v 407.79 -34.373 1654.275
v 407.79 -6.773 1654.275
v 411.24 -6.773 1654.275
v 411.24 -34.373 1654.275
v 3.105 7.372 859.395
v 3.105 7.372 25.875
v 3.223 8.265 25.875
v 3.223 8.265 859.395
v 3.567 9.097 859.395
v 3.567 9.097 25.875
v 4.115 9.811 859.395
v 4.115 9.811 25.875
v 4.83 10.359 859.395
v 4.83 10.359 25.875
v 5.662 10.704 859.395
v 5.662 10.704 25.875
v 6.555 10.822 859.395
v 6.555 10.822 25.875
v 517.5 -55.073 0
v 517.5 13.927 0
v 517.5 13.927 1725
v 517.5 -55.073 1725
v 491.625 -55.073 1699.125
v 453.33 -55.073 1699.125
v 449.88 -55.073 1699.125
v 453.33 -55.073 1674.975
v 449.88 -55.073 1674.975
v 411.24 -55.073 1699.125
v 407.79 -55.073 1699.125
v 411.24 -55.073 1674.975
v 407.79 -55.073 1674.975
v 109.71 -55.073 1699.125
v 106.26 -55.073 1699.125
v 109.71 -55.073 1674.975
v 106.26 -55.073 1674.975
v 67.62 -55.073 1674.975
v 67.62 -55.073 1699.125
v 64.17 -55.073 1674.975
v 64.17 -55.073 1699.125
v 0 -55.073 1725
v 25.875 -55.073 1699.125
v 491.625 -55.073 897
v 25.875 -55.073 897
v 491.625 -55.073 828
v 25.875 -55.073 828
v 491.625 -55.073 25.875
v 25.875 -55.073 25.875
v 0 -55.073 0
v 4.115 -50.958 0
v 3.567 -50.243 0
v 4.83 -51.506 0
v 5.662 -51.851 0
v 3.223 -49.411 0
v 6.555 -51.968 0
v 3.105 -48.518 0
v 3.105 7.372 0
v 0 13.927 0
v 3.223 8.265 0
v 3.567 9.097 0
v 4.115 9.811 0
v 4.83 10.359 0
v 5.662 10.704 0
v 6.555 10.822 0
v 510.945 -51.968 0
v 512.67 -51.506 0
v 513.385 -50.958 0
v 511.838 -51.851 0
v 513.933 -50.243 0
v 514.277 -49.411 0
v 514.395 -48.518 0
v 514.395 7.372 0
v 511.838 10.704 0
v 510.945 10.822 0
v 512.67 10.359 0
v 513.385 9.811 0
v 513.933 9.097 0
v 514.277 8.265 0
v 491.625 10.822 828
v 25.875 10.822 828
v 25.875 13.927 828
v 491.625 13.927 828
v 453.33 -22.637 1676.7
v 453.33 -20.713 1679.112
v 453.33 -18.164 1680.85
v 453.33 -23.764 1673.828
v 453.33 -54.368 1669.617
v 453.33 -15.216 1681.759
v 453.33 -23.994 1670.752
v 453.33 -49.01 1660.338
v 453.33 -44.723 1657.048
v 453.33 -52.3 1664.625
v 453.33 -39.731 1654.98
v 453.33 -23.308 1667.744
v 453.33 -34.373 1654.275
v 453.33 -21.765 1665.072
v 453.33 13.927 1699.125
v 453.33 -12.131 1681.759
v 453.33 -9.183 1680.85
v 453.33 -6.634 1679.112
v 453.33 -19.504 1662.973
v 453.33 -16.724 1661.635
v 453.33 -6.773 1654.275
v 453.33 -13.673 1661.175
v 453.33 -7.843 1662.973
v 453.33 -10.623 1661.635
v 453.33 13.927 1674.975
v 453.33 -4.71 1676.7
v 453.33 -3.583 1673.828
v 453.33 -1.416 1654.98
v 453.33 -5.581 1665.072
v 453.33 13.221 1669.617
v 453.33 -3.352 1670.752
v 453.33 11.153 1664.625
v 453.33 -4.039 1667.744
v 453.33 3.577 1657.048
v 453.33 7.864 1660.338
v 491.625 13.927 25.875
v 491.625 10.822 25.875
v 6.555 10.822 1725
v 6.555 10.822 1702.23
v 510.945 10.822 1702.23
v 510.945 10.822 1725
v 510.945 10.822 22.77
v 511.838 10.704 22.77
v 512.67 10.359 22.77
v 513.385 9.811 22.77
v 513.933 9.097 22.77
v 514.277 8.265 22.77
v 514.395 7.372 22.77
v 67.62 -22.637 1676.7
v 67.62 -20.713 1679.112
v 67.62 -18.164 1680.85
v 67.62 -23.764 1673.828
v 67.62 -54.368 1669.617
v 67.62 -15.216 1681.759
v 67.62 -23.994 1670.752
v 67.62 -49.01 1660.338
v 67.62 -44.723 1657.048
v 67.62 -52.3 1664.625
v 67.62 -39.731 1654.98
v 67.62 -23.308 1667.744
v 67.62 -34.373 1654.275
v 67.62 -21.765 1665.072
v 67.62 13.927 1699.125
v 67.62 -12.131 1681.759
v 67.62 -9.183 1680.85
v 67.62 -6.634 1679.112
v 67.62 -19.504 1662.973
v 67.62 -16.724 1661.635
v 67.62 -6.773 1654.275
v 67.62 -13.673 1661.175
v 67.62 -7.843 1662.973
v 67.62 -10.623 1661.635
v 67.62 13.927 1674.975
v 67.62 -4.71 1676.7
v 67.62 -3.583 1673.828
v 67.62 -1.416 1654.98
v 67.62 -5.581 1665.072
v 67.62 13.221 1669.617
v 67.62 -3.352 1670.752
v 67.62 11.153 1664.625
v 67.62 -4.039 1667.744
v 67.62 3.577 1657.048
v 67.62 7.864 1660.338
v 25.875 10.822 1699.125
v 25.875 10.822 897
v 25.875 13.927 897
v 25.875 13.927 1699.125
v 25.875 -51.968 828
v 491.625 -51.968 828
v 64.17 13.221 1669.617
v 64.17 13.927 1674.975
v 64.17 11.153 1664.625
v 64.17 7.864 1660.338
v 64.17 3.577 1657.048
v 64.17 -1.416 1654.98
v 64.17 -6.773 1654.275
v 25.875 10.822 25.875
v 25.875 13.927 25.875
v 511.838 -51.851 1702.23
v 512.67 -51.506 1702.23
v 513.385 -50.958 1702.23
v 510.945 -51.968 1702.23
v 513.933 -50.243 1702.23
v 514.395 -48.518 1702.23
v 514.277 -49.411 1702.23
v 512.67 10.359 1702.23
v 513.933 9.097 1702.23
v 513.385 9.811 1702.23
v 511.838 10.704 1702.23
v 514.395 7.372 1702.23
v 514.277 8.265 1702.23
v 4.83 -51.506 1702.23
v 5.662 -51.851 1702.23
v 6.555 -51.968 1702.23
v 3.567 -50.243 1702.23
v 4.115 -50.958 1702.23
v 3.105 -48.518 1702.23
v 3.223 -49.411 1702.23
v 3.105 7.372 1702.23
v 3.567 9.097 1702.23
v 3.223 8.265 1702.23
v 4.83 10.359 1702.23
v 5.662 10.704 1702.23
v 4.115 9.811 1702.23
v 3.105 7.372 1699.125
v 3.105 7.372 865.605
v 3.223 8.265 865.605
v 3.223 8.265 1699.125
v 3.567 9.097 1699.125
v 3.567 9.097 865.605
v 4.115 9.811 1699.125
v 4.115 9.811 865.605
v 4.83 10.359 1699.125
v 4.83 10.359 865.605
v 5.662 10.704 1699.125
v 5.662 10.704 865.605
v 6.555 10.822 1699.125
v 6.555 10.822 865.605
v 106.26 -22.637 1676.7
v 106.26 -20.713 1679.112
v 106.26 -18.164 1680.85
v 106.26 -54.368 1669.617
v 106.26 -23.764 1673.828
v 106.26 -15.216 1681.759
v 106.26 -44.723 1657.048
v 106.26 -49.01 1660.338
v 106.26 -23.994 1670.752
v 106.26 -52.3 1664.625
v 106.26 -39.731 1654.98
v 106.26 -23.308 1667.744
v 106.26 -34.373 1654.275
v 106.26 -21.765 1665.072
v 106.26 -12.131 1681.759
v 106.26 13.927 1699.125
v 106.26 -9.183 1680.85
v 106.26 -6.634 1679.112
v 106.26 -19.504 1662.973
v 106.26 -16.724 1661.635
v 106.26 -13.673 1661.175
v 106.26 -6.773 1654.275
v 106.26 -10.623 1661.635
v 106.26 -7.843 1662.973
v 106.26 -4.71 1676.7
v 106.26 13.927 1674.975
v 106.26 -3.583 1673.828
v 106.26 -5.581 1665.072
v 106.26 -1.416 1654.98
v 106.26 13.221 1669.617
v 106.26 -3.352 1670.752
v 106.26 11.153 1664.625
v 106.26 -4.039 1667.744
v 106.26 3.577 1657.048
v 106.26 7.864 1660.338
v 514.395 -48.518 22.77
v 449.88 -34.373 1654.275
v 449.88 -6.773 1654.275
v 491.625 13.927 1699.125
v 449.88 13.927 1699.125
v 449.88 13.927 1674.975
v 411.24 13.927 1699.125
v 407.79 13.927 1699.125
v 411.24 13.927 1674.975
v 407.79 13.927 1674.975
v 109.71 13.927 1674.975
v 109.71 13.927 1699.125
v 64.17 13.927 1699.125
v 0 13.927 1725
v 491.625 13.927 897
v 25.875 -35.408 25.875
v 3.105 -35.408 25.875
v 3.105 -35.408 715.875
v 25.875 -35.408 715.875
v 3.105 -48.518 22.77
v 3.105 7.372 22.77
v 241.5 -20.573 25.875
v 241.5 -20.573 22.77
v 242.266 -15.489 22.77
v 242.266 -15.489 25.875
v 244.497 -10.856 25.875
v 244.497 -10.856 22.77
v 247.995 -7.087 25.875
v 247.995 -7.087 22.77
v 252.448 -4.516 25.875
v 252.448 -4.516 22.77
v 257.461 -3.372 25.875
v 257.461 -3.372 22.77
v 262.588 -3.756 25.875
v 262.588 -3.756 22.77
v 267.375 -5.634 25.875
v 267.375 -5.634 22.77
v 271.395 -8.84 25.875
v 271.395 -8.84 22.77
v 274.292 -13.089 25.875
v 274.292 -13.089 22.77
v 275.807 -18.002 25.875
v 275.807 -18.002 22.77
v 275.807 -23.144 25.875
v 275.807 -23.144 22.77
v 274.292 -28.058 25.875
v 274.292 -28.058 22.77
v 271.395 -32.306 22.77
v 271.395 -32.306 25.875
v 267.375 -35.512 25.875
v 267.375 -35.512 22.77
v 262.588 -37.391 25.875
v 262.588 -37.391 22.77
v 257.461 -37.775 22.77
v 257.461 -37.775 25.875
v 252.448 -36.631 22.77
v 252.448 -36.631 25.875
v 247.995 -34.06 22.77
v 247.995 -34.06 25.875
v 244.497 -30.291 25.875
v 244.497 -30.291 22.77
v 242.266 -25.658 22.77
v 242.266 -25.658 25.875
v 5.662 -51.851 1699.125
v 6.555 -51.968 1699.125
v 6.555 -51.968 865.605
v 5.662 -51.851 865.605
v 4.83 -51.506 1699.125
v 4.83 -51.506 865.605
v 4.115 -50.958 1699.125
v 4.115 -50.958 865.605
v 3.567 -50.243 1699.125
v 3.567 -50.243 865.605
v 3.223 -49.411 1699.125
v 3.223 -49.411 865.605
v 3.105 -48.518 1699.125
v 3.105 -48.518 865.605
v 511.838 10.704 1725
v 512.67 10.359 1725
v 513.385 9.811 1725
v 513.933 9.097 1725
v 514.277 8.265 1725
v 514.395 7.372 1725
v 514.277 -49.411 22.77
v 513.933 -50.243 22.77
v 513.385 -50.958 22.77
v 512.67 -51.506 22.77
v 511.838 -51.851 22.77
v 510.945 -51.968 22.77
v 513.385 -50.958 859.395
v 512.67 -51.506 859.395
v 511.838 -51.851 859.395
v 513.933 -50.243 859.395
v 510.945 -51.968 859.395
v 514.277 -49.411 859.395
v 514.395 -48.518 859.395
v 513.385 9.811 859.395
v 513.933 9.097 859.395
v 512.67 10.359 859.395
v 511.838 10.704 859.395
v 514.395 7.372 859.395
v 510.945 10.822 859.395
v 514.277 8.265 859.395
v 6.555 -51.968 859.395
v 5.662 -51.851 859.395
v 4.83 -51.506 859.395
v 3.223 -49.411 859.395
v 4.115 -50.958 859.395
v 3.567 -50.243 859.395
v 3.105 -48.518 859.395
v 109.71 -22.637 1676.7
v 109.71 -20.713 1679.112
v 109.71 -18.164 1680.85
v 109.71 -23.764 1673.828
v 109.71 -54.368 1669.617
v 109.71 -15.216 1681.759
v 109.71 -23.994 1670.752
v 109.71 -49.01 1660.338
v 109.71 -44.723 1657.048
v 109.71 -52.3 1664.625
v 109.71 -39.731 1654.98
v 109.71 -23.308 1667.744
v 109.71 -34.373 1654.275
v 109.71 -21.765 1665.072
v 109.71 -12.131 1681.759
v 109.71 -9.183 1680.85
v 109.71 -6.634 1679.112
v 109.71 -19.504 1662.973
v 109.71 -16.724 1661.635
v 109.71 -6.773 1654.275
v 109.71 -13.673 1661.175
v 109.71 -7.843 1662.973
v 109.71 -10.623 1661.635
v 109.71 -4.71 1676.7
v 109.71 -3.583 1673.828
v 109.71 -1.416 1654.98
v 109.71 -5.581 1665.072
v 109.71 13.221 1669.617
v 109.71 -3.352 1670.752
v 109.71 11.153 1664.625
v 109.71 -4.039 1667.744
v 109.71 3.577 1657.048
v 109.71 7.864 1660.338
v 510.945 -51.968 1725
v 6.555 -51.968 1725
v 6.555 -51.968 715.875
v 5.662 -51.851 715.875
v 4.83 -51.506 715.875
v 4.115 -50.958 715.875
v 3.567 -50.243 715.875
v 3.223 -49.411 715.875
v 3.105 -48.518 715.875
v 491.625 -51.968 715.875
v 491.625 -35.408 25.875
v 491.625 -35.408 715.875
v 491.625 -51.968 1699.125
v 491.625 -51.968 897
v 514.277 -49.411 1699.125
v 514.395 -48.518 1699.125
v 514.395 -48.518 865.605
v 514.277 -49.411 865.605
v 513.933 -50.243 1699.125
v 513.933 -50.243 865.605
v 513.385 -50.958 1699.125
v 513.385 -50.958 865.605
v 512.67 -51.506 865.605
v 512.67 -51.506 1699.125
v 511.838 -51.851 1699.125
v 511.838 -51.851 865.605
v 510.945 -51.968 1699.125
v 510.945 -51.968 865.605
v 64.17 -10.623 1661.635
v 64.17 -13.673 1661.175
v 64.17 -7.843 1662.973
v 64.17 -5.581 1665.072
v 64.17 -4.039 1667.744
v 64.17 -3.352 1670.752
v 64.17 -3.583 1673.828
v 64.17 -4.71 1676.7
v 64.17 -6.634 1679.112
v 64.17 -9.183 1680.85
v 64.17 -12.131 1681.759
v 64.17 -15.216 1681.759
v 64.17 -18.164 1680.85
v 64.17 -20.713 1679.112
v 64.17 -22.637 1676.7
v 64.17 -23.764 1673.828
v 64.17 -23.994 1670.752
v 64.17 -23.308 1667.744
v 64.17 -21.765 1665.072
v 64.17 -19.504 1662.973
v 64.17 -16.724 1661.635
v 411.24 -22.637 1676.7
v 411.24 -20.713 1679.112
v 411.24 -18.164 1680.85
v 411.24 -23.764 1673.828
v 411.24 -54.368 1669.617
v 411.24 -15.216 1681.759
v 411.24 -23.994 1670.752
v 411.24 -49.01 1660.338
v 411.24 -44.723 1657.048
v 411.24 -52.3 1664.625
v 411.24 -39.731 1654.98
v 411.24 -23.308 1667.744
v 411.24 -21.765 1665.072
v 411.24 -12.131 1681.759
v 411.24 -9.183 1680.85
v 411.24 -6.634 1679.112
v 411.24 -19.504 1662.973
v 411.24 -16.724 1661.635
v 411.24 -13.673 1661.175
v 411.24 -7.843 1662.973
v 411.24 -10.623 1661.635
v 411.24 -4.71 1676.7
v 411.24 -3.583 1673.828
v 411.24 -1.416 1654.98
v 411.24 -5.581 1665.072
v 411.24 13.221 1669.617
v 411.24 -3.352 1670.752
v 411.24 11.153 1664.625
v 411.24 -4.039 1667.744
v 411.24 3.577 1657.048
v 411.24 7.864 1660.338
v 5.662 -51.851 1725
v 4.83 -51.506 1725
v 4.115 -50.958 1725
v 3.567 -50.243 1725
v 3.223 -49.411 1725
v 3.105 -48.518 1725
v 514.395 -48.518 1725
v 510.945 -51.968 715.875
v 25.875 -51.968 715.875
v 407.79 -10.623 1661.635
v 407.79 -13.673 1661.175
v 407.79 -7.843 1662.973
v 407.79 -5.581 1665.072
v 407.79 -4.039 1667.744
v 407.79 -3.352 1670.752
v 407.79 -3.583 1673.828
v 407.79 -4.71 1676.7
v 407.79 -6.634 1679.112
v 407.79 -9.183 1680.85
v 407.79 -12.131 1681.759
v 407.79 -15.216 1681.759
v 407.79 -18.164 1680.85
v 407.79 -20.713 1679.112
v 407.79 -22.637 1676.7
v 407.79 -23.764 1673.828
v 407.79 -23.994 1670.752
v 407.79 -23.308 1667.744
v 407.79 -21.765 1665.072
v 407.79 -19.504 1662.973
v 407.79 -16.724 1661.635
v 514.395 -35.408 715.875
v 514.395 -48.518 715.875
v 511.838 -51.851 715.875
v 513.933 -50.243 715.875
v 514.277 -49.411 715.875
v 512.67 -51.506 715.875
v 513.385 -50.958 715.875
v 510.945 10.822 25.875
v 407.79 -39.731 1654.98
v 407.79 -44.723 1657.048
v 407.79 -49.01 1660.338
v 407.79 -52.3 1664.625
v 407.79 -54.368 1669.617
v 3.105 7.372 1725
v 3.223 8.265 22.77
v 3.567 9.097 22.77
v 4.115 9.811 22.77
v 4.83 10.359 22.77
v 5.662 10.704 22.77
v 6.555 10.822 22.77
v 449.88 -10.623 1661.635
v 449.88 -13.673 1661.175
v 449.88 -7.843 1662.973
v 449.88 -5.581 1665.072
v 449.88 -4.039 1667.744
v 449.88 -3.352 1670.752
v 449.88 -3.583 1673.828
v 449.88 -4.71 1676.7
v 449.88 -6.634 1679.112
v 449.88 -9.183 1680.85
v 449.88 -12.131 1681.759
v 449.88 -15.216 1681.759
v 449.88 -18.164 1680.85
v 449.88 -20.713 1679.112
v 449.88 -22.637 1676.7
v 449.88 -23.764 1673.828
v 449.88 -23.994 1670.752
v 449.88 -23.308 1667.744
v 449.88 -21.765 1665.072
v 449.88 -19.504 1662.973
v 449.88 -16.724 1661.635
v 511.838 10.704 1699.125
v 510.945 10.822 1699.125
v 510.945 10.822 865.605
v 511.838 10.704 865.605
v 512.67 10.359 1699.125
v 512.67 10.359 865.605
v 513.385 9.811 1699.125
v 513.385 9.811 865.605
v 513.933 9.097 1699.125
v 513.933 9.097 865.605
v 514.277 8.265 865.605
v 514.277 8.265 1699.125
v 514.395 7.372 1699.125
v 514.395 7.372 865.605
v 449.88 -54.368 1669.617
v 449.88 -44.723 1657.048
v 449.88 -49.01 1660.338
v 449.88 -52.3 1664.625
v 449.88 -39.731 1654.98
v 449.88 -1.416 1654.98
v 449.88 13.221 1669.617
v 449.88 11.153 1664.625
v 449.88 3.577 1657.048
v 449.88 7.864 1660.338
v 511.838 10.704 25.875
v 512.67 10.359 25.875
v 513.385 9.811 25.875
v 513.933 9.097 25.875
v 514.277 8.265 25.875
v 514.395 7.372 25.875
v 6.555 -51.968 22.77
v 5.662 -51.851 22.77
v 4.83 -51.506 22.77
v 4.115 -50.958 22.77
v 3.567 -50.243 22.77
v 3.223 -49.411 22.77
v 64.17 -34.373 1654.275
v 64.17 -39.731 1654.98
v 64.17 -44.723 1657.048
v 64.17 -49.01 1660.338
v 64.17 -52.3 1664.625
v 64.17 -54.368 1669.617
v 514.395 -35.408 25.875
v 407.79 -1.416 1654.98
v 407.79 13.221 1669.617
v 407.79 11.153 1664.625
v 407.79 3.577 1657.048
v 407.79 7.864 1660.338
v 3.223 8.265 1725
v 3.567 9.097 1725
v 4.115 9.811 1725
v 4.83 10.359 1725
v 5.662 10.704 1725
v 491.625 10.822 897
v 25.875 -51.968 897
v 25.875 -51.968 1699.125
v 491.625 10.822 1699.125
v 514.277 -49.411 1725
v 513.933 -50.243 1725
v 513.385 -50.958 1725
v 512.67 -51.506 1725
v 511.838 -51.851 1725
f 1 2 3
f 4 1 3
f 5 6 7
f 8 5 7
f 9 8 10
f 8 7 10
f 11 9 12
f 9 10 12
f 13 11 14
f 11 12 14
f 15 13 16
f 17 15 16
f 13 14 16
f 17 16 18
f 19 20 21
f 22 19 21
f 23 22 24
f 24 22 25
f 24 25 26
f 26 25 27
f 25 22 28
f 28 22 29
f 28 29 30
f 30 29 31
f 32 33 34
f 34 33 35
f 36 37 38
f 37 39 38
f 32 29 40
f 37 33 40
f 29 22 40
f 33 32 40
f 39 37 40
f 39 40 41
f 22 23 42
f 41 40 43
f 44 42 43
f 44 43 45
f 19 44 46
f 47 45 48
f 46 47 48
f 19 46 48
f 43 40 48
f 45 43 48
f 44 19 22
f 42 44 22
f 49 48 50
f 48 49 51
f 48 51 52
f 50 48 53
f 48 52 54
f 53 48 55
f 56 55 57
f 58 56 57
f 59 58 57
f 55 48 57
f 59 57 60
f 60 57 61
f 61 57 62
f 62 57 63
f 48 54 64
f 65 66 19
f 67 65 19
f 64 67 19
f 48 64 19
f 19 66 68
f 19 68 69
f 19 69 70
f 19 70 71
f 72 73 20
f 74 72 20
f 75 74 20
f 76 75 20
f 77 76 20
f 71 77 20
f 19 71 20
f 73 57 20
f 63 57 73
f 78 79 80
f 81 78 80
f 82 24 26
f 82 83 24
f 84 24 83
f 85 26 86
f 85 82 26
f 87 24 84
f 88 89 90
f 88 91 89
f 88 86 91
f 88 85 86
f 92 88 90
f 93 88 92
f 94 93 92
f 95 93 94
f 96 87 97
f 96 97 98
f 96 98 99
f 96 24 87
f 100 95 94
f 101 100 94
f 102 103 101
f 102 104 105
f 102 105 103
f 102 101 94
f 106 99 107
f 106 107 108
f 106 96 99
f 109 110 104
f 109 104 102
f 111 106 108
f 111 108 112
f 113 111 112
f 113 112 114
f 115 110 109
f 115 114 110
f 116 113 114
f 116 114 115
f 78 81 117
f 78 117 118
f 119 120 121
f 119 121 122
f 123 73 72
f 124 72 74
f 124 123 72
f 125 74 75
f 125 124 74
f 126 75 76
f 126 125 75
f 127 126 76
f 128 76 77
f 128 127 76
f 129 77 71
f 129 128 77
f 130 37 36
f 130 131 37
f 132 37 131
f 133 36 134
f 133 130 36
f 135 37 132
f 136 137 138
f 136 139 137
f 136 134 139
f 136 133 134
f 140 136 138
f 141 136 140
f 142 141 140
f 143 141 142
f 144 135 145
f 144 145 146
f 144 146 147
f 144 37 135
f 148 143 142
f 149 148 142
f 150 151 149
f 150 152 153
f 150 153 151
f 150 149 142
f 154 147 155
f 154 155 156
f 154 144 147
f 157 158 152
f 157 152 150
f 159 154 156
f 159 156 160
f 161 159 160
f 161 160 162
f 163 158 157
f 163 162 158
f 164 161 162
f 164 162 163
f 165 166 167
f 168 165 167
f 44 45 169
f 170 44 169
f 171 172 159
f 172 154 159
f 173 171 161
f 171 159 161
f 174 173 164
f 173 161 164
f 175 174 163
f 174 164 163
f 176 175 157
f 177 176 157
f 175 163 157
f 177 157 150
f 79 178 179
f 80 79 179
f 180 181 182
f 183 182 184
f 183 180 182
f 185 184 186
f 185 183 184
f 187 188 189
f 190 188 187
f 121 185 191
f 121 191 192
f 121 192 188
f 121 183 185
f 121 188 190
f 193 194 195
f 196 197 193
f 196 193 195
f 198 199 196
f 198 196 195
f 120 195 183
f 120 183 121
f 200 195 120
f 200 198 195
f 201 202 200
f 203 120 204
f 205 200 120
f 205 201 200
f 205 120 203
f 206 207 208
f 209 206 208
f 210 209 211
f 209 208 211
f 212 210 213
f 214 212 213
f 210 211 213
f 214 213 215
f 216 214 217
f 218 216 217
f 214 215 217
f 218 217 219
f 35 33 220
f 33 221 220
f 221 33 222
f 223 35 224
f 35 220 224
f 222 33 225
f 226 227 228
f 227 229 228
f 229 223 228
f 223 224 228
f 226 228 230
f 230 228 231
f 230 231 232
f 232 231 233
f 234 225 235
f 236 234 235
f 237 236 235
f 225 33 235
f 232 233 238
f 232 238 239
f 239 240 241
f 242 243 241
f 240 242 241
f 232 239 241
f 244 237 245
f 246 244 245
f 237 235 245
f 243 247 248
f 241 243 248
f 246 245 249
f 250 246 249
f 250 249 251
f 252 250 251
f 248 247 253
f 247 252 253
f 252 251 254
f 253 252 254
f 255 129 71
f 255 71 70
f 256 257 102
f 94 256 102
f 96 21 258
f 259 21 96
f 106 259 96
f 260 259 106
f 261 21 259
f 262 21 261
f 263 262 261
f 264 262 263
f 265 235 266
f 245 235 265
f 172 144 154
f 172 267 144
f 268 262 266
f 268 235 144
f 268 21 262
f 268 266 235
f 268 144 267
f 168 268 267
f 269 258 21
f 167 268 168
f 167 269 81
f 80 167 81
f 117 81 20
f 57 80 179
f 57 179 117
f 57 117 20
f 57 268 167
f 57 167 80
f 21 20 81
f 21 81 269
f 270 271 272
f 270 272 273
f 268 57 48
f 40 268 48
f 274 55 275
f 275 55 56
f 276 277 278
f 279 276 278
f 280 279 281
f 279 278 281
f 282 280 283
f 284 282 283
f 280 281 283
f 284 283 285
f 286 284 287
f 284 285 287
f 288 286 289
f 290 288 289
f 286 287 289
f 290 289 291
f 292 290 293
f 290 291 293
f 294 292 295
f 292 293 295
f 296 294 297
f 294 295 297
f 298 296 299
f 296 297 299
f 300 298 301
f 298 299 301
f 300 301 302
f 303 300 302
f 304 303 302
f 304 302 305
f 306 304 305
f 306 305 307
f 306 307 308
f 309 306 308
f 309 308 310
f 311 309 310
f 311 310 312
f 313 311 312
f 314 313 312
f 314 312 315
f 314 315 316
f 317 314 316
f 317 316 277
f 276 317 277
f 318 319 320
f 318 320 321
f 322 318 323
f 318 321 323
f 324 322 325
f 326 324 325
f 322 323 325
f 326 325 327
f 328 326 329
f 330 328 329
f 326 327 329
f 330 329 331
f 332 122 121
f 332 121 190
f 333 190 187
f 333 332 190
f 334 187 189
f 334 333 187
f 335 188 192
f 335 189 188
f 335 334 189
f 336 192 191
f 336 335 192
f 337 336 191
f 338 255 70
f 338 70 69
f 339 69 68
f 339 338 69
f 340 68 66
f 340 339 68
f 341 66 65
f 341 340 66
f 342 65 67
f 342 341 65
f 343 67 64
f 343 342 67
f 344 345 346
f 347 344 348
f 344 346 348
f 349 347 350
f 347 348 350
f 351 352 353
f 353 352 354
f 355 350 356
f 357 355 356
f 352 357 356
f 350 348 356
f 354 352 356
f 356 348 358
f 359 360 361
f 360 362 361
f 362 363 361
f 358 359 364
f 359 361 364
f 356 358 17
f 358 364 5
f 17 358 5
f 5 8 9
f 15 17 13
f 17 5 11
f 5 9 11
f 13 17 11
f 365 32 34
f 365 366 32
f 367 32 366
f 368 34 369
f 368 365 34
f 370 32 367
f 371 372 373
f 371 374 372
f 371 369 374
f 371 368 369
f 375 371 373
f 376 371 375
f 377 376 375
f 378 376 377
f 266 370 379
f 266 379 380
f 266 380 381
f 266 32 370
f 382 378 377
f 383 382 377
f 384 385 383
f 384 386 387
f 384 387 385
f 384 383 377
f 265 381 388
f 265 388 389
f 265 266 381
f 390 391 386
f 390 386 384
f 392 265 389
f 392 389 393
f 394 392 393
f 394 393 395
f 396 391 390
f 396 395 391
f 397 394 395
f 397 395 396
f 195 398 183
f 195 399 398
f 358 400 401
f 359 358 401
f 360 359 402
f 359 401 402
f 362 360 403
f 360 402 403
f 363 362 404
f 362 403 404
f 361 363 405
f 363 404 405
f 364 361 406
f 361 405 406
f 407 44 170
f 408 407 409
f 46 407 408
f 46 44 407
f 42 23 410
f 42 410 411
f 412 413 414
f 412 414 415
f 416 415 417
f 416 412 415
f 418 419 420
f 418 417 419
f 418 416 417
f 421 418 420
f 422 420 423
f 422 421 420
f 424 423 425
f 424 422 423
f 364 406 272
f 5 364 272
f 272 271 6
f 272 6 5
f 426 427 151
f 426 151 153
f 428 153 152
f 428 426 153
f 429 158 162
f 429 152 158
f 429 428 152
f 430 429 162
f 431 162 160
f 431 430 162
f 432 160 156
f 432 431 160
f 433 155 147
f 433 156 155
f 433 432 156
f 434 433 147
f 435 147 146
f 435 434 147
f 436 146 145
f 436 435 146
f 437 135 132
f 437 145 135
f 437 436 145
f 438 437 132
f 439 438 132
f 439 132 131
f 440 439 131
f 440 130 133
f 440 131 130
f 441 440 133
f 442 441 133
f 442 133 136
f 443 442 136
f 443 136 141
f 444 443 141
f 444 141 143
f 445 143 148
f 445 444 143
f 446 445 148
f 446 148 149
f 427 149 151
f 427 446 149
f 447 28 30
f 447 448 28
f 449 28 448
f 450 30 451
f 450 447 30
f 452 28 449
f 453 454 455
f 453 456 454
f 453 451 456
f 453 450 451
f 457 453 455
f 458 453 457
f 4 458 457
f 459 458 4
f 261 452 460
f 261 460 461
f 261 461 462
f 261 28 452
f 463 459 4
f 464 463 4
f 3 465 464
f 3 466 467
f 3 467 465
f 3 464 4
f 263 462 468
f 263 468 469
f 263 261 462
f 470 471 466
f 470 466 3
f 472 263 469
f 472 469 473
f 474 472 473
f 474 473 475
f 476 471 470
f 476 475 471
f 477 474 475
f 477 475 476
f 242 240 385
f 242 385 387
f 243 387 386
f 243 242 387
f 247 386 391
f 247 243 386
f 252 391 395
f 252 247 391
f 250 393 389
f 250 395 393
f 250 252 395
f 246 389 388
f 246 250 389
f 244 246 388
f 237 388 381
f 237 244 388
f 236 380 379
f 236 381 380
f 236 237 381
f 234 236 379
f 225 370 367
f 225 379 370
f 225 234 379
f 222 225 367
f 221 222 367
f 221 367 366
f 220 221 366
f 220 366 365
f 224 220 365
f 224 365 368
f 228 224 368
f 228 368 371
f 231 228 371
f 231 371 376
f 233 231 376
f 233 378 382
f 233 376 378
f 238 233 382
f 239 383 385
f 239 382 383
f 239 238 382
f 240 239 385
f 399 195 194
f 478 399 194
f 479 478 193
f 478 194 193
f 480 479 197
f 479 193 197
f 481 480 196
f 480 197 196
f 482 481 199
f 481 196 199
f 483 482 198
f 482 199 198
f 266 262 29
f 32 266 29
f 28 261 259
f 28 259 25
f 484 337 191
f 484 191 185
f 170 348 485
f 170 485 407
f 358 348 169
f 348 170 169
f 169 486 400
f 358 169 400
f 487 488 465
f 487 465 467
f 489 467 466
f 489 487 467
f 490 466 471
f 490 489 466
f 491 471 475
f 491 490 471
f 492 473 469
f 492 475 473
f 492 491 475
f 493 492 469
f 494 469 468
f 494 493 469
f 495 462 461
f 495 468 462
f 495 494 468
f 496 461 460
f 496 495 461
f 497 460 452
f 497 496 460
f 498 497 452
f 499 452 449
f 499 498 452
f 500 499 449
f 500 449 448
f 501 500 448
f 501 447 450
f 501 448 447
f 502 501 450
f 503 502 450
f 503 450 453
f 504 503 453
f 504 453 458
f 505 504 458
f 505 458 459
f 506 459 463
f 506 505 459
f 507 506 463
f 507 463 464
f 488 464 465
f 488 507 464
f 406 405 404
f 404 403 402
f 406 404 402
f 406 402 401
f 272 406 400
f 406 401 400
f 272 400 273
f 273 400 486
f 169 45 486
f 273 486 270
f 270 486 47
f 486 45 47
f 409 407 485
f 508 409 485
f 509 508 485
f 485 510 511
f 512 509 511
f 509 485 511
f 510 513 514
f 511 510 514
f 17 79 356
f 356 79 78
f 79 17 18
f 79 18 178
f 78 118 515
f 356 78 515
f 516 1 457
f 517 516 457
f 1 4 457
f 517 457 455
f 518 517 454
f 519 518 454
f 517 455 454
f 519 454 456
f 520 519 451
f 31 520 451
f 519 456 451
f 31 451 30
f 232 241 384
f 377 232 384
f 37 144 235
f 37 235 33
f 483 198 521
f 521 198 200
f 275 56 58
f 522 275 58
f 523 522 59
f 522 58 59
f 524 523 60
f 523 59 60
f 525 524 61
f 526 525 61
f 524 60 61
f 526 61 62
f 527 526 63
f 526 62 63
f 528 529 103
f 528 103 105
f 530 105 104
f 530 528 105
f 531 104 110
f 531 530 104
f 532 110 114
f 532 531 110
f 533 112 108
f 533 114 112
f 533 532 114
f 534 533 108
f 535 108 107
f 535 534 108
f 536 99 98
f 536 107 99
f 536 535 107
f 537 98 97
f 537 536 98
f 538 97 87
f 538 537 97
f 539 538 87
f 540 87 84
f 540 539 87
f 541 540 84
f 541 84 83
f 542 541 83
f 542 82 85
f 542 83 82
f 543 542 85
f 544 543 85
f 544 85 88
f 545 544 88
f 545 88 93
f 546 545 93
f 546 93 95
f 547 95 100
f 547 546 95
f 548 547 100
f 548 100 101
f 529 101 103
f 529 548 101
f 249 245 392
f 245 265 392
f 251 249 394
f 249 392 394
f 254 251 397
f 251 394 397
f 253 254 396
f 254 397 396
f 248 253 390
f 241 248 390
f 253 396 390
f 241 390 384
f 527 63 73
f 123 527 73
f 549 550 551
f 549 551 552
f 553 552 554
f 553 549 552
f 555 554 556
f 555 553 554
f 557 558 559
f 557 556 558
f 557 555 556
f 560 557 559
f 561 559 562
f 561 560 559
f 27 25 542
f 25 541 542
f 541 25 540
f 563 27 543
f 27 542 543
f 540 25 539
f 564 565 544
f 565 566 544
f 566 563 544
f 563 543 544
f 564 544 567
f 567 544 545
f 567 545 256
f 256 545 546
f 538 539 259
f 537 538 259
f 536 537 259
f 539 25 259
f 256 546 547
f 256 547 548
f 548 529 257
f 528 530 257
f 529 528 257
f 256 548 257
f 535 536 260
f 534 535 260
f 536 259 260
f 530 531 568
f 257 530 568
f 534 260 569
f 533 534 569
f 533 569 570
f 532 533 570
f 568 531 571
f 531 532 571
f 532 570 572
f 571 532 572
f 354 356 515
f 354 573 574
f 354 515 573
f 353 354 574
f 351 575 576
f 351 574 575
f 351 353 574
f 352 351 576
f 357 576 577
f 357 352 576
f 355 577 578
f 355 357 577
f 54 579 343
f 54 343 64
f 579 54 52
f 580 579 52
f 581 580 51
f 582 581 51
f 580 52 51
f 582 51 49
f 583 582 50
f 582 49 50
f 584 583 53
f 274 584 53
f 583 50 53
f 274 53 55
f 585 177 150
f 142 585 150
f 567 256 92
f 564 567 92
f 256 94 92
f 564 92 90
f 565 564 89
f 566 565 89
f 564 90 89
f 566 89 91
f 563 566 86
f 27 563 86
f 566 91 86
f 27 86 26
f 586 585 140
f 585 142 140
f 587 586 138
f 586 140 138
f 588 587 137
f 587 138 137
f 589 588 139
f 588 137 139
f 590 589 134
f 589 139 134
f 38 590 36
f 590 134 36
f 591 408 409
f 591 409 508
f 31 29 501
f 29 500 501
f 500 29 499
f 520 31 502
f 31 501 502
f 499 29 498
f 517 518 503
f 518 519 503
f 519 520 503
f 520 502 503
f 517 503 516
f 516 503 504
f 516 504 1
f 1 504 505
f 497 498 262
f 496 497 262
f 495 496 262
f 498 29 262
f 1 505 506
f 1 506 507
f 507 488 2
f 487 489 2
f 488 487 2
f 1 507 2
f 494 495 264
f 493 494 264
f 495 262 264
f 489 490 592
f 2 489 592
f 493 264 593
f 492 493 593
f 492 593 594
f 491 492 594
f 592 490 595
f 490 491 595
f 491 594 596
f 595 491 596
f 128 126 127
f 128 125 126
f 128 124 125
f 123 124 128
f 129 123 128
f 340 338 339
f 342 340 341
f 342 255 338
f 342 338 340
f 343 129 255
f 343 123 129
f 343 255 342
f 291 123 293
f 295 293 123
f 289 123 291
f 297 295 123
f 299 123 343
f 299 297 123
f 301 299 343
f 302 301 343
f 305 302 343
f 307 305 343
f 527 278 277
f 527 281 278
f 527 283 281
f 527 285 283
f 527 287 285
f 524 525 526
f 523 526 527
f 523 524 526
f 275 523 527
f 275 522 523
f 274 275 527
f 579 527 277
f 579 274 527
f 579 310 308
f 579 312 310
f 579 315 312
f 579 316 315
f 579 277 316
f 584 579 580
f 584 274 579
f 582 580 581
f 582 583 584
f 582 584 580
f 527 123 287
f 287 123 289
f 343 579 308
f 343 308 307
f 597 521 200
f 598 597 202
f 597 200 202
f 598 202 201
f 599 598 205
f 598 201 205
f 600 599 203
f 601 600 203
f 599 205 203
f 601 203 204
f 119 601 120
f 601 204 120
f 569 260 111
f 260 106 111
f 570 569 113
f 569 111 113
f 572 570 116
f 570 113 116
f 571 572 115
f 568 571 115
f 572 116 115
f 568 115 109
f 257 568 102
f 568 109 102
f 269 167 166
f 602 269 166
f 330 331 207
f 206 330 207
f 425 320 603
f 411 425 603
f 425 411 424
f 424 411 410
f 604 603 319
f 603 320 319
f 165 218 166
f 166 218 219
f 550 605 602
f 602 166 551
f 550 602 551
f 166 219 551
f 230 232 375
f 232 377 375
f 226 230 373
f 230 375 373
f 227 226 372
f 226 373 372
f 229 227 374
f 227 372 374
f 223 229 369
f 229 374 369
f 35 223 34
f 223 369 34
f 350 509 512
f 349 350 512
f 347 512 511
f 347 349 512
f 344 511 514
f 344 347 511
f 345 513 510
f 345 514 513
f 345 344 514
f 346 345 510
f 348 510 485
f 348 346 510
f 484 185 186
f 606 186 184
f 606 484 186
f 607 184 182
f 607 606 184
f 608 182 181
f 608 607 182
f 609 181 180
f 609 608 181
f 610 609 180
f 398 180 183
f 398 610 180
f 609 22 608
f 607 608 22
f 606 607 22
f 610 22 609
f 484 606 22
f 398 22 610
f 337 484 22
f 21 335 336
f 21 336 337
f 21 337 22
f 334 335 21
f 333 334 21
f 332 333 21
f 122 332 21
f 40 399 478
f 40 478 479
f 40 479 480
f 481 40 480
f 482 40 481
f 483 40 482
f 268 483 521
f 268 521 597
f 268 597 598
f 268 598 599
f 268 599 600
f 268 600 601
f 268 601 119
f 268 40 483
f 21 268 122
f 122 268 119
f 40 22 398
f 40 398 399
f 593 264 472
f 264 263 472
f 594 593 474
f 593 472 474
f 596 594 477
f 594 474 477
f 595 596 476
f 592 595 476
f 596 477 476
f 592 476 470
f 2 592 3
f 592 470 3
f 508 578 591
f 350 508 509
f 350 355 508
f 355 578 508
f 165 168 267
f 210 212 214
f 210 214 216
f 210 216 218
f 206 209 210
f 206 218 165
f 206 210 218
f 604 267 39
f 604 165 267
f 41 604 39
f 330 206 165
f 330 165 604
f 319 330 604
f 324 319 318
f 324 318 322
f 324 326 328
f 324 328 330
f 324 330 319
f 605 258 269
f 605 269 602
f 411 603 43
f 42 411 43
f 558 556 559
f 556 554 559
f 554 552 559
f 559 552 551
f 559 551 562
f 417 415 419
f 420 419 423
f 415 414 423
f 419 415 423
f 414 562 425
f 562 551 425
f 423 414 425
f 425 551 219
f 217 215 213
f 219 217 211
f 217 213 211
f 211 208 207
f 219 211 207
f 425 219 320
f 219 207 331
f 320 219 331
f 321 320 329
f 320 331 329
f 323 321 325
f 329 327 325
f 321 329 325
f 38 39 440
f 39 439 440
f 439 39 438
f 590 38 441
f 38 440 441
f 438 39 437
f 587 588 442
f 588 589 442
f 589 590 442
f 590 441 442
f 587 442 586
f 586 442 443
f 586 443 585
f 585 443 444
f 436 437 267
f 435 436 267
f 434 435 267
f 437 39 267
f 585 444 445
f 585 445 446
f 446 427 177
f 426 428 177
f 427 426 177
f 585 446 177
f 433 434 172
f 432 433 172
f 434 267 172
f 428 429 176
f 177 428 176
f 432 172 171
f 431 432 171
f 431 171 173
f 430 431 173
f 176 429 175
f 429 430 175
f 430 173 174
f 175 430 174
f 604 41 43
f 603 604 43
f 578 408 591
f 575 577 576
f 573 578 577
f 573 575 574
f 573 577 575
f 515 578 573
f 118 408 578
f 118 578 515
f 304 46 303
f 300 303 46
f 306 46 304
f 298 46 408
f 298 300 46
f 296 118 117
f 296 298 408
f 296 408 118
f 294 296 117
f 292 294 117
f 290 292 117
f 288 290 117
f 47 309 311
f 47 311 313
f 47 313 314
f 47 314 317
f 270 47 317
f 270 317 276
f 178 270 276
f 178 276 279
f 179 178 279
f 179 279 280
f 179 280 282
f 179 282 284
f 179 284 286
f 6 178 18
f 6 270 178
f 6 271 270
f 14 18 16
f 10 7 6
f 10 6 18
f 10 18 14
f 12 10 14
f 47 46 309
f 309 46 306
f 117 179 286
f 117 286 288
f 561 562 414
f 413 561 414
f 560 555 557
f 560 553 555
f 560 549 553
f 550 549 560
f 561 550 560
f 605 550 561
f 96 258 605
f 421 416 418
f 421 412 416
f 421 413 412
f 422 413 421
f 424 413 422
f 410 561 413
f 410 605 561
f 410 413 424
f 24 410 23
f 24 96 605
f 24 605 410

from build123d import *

# Parameters (mm, degrees)
EXTRUDE_1_DEPTH          = 5000
EXTRUDE_3_DEPTH          = 1500
EXTRUDE_START            = -5000
EXTRUDE_4_DEPTH          = 5000
SKETCH_5_W               = 10
SKETCH_5_H               = 130
EXTRUDE_5_DEPTH          = 200
CUT_EXTRUDE_1_DEPTH      = 1006
CUT_EXTRUDE_1_DEPTH_BACK = 147
SKETCH_6_R               = 30
FILLET_1_R               = 60
SKETCH_7_W               = 70
SKETCH_7_H               = 2000
EXTRUDE_6_DEPTH          = 48
EXTRUDE_7_REACH          = 5224.593
SKETCH_9_R               = 50
CUT_EXTRUDE_2_DEPTH      = 219
SCALE_3_SCALE            = 0.345


with BuildPart() as part:
    # 草图1 → 凸台-拉伸1 (new body)
    with BuildSketch(Plane.XY):
        with BuildLine():
            Line((0, 40.367089679), (0, -159.632910321))
            Line((0, -159.632910321), (75, -159.632910321))
            Line((75, -159.632910321), (75, -150.632910321))
            Line((75, -150.632910321), (19, -150.632910321))
            ThreePointArc((19, -150.632910321), (11.928932188, -147.703978133), (9, -140.632910321))
            Line((9, -140.632910321), (9, 21.367089679))
            ThreePointArc((9, 21.367089679), (11.928932188, 28.43815749), (19, 31.367089679))
            Line((19, 31.367089679), (75, 31.367089679))
            Line((75, 31.367089679), (75, 40.367089679))
            Line((75, 40.367089679), (0, 40.367089679))
        make_face()
    extrude(amount=EXTRUDE_1_DEPTH)

    # 草图2 → 凸台-拉伸3 (add)
    with BuildSketch(Plane.ZY):
        Polygon((5000, 40.367089679), (4925, 40.367089679), (4925, -159.632910321), (5000, -159.632910321), (5000, -150.632910321), (4934, -150.632910321), (4934, 31.367089679), (5000, 31.367089679), align=None)
        Polygon((0, -150.632910321), (0, -159.632910321), (75, -159.632910321), (75, 40.367089679), (0, 40.367089679), (0, 31.367089679), (66, 31.367089679), (66, -150.632910321), align=None)
    extrude(amount=-EXTRUDE_3_DEPTH)

    # 草图3 → 凸台-拉伸4 (add)
    with BuildSketch(Plane(origin=(0, 0, 0), x_dir=(-1, 0, 0), z_dir=(0, 0, -1)).offset(EXTRUDE_START)):
        with BuildLine():
            Line((-1500, 40.367089679), (-1425, 40.367089679))
            Line((-1425, 40.367089679), (-1425, 31.367089679))
            Line((-1425, 31.367089679), (-1481, 31.367089679))
            ThreePointArc((-1481, 31.367089679), (-1488.071067812, 28.43815749), (-1491, 21.367089679))
            Line((-1491, 21.367089679), (-1491, -140.632910321))
            ThreePointArc((-1491, -140.632910321), (-1488.071067812, -147.703978133), (-1481, -150.632910321))
            Line((-1481, -150.632910321), (-1425, -150.632910321))
            Line((-1425, -150.632910321), (-1425, -159.632910321))
            Line((-1425, -159.632910321), (-1500, -159.632910321))
            Line((-1500, -159.632910321), (-1500, 40.367089679))
        make_face()
    extrude(amount=EXTRUDE_4_DEPTH)

    # 草图5 → 凸台-拉伸5 (add)
    with BuildSketch(Plane(origin=(0, 40.367089679, 0), x_dir=(1, 0, 0), z_dir=(0, 1, 0))):
        with Locations((191, -4860)):
            Rectangle(SKETCH_5_W, SKETCH_5_H)
        with Locations((313, -4860)):
            Rectangle(SKETCH_5_W, SKETCH_5_H)
        with Locations((1309, -4860)):
            Rectangle(SKETCH_5_W, SKETCH_5_H)
        with Locations((1187, -4860)):
            Rectangle(SKETCH_5_W, SKETCH_5_H)
    extrude(amount=-EXTRUDE_5_DEPTH)

    # 草图6 → 切除-拉伸1 (cut, two sides: drawn at the far end of the back side and taken through both)
    with BuildSketch(Plane(origin=(318, 0, 0), x_dir=(0, 0, -1), z_dir=(1, 0, 0)).offset(-CUT_EXTRUDE_1_DEPTH_BACK)):
        with Locations((-4845, -39.632910321)):
            Circle(SKETCH_6_R)
    extrude(amount=CUT_EXTRUDE_1_DEPTH + CUT_EXTRUDE_1_DEPTH_BACK, mode=Mode.SUBTRACT)

    # 圆角1
    fillet_1_edges = [part.edges().sort_by_distance(p)[0] for p in [
        (191, -159.632910321, 4795),
        (191, 40.367089679, 4795),
        (313, -159.632910321, 4795),
        (313, 40.367089679, 4795),
        (1187, -159.632910321, 4795),
        (1187, 40.367089679, 4795),
        (1309, -159.632910321, 4795),
        (1309, 40.367089679, 4795),
    ]]
    fillet(fillet_1_edges, radius=FILLET_1_R)

    # 草图7 → 凸台-拉伸6 (add)
    with BuildSketch(Plane(origin=(0, -150.632910321, 0), x_dir=(1, 0, 0), z_dir=(0, 1, 0))):
        with Locations((40, -1075)):
            Rectangle(SKETCH_7_W, SKETCH_7_H)
        with Locations((1460, -1075)):
            Rectangle(SKETCH_7_W, SKETCH_7_H)
    extrude(amount=EXTRUDE_6_DEPTH)

    # 凸台-拉伸7: up to this face of the body (flat: up to its plane)
    extrude_7_end = Plane(part.part.faces().sort_by_distance((1491, -52.993485212, 2652.59969001))[0])
    # 草图8 → 凸台-拉伸7 (add, up to the picked face)
    with BuildSketch(Plane.ZY, mode=Mode.PRIVATE) as extrude_7_sk1:
        Polygon((2400, 40.367089679), (2600, 40.367089679), (2600, 31.367089679), (2509, 31.367089679), (2509, -150.632910321), (2600, -150.632910321), (2600, -159.632910321), (2400, -159.632910321), (2400, -150.632910321), (2491, -150.632910321), (2491, 31.367089679), (2400, 31.367089679), align=None)
    extrude_7_tool1 = split(extrude(extrude_7_sk1.sketch, amount=-EXTRUDE_7_REACH, mode=Mode.PRIVATE), bisect_by=extrude_7_end, keep=Keep.BOTH, mode=Mode.PRIVATE)
    add(extrude_7_tool1.solids().sort_by(Axis((0, -59.63291, 2500), (1, 0, 0)))[0])

    # 草图9 → 切除-拉伸2 (cut)
    with BuildSketch(Plane(origin=(0, 0, 66), x_dir=(-1, 0, 0), z_dir=(0, 0, -1))):
        with Locations((-750, -59.632910321)):
            Circle(SKETCH_9_R)
    extrude(amount=-CUT_EXTRUDE_2_DEPTH, mode=Mode.SUBTRACT)


with BuildPart() as part_1:
    # 缩放比例3: scaled about (0, 0, 0)
    add(part.part.scale(SCALE_3_SCALE))


solid = part_1.part
